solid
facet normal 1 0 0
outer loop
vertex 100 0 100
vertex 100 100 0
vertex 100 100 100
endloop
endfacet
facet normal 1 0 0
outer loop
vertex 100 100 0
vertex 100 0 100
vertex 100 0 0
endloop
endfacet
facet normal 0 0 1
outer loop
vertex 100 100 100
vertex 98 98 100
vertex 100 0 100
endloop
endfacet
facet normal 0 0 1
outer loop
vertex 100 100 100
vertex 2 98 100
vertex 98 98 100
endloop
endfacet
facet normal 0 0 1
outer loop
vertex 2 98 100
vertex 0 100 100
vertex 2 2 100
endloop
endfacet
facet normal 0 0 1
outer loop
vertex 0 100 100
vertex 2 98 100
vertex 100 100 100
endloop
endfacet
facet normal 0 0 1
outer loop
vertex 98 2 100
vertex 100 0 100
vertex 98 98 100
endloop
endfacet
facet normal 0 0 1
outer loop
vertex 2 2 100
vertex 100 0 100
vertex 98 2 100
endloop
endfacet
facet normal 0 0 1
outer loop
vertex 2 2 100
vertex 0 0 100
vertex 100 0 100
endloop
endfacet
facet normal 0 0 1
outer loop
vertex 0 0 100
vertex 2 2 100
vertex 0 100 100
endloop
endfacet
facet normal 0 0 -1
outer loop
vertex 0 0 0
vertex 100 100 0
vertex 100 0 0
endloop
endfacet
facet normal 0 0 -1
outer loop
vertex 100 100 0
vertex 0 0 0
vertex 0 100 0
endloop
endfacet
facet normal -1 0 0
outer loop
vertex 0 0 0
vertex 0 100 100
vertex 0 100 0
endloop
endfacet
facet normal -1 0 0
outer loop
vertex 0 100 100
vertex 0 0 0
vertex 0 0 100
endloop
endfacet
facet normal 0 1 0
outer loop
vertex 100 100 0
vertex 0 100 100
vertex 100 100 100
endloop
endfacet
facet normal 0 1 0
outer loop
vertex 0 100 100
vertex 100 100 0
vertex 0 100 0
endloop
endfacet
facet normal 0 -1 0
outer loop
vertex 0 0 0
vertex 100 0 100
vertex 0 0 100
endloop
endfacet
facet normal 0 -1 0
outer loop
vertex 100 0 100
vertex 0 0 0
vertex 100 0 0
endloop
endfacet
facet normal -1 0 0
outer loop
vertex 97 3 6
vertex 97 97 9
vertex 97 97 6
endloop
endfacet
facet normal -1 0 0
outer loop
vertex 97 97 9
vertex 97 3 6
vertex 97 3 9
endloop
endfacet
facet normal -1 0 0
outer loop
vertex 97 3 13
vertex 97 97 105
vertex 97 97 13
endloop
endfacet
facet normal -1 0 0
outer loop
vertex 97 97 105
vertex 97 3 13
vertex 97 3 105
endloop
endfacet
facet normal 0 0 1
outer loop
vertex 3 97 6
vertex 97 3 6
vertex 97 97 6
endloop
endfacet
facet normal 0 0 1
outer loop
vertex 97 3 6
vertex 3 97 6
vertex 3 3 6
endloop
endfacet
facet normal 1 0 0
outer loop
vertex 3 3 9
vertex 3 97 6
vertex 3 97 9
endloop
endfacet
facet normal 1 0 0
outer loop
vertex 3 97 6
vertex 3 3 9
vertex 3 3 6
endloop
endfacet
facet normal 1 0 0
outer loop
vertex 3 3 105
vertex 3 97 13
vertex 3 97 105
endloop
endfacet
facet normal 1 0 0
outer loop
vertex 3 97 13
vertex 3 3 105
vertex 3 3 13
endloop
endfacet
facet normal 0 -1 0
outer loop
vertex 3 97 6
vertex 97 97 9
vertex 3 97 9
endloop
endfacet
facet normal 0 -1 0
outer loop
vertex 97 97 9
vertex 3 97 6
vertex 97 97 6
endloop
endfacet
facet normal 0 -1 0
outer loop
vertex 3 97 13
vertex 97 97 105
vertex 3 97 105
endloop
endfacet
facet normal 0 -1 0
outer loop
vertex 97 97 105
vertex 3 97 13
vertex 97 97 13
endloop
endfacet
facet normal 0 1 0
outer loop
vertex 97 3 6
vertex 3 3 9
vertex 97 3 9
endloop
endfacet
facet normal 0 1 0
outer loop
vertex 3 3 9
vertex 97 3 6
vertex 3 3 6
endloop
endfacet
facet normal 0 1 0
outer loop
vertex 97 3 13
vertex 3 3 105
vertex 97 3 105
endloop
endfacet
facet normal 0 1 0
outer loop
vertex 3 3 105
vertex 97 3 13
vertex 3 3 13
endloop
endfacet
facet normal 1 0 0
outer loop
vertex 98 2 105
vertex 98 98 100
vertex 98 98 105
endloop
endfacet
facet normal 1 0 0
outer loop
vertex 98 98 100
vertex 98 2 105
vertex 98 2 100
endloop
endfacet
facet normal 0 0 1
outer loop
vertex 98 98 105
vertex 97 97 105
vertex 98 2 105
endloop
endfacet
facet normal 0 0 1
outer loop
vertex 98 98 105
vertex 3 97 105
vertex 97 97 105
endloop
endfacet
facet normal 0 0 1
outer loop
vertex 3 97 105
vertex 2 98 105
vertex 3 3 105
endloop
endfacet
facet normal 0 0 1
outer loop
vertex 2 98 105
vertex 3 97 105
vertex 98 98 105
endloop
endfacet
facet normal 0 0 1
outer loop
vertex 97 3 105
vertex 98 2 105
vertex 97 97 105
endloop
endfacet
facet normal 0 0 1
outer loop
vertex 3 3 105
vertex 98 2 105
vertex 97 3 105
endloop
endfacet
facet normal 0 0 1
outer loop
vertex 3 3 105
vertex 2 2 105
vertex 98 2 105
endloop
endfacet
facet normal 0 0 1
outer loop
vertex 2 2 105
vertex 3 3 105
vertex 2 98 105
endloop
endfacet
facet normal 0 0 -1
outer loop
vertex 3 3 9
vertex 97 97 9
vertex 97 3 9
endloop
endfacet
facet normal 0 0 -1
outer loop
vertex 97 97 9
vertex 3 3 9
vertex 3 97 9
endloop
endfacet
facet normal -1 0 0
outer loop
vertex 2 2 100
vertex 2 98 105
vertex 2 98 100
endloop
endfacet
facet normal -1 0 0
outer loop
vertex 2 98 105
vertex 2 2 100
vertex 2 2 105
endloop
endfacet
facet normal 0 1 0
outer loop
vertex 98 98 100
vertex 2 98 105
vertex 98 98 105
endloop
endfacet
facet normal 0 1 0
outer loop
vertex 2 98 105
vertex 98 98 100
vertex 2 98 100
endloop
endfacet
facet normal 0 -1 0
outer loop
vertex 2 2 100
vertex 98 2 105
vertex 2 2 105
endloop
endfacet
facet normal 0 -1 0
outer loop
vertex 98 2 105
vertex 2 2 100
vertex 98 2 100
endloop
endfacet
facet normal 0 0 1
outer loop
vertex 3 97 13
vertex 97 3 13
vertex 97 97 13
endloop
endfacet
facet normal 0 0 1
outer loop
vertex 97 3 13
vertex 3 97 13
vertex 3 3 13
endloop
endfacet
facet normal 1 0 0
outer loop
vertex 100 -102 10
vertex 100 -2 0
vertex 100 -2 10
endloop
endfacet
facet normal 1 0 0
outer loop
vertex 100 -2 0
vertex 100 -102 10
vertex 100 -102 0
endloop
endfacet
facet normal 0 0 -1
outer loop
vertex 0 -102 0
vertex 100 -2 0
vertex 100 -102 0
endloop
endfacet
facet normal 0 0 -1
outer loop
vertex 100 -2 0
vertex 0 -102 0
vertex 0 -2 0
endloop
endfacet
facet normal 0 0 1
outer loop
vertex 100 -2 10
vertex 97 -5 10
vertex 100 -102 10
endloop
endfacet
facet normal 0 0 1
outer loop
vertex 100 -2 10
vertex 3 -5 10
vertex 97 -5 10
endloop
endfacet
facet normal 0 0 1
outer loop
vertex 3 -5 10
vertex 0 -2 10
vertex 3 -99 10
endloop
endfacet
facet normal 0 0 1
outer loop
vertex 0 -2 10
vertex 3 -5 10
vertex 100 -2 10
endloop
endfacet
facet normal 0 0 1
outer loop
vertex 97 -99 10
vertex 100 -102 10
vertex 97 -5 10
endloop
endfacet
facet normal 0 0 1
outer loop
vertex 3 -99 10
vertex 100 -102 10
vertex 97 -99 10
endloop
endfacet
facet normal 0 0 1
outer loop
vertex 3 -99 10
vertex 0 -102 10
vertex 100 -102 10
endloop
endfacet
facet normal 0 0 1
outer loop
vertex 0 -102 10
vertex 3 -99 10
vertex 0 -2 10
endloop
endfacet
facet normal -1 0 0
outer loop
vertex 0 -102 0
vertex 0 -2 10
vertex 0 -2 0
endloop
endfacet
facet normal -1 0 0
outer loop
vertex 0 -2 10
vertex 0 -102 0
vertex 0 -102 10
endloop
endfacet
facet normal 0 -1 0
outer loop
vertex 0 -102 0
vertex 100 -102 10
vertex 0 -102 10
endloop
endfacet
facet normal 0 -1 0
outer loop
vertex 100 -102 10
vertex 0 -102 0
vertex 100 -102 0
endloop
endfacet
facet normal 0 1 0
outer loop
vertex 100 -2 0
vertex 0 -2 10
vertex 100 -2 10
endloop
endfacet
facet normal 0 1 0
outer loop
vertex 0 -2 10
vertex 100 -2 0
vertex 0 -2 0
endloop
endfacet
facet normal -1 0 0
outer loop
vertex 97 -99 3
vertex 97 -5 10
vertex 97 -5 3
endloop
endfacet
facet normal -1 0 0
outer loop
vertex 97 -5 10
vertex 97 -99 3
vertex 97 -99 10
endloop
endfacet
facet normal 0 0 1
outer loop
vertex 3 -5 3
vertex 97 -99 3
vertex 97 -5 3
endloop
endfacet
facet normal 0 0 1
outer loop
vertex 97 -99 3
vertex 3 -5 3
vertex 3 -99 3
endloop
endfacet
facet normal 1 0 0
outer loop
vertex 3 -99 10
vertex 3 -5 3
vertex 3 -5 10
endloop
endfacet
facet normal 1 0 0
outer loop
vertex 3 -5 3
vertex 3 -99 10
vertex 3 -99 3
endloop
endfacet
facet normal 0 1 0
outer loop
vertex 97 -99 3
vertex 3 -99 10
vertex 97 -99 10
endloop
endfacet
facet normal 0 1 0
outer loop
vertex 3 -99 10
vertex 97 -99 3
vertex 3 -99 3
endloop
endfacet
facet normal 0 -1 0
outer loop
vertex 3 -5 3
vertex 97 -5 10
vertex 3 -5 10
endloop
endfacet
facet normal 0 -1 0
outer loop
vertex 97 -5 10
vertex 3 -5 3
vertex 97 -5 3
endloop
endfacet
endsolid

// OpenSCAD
//Loguncov Maxim 21.01.2014

	//Коробка
	difference() {
		cube([100,100 ,100 ]);
		translate([3,3 ,6]) {
			cube([94,94 ,94 ]);
		}
	}

	//Выступ
	difference() {
		
			translate([2,2 ,9 ]) {
				cube([96,96 ,96 ]);
			}
			translate([3, 3, 13]) {
				cube([94, 94, 94]);
			}
		
		
	}

	//Крышка
translate([0,-2 ,10 ]) {
	rotate([180,0,0])
difference() {
		translate([0, 0, 0]) {
			cube([100,100 ,10 ]);
		}
		translate([3,3 , 0]) {
			cube([94,94 ,7 ]);
		}
	}
}
